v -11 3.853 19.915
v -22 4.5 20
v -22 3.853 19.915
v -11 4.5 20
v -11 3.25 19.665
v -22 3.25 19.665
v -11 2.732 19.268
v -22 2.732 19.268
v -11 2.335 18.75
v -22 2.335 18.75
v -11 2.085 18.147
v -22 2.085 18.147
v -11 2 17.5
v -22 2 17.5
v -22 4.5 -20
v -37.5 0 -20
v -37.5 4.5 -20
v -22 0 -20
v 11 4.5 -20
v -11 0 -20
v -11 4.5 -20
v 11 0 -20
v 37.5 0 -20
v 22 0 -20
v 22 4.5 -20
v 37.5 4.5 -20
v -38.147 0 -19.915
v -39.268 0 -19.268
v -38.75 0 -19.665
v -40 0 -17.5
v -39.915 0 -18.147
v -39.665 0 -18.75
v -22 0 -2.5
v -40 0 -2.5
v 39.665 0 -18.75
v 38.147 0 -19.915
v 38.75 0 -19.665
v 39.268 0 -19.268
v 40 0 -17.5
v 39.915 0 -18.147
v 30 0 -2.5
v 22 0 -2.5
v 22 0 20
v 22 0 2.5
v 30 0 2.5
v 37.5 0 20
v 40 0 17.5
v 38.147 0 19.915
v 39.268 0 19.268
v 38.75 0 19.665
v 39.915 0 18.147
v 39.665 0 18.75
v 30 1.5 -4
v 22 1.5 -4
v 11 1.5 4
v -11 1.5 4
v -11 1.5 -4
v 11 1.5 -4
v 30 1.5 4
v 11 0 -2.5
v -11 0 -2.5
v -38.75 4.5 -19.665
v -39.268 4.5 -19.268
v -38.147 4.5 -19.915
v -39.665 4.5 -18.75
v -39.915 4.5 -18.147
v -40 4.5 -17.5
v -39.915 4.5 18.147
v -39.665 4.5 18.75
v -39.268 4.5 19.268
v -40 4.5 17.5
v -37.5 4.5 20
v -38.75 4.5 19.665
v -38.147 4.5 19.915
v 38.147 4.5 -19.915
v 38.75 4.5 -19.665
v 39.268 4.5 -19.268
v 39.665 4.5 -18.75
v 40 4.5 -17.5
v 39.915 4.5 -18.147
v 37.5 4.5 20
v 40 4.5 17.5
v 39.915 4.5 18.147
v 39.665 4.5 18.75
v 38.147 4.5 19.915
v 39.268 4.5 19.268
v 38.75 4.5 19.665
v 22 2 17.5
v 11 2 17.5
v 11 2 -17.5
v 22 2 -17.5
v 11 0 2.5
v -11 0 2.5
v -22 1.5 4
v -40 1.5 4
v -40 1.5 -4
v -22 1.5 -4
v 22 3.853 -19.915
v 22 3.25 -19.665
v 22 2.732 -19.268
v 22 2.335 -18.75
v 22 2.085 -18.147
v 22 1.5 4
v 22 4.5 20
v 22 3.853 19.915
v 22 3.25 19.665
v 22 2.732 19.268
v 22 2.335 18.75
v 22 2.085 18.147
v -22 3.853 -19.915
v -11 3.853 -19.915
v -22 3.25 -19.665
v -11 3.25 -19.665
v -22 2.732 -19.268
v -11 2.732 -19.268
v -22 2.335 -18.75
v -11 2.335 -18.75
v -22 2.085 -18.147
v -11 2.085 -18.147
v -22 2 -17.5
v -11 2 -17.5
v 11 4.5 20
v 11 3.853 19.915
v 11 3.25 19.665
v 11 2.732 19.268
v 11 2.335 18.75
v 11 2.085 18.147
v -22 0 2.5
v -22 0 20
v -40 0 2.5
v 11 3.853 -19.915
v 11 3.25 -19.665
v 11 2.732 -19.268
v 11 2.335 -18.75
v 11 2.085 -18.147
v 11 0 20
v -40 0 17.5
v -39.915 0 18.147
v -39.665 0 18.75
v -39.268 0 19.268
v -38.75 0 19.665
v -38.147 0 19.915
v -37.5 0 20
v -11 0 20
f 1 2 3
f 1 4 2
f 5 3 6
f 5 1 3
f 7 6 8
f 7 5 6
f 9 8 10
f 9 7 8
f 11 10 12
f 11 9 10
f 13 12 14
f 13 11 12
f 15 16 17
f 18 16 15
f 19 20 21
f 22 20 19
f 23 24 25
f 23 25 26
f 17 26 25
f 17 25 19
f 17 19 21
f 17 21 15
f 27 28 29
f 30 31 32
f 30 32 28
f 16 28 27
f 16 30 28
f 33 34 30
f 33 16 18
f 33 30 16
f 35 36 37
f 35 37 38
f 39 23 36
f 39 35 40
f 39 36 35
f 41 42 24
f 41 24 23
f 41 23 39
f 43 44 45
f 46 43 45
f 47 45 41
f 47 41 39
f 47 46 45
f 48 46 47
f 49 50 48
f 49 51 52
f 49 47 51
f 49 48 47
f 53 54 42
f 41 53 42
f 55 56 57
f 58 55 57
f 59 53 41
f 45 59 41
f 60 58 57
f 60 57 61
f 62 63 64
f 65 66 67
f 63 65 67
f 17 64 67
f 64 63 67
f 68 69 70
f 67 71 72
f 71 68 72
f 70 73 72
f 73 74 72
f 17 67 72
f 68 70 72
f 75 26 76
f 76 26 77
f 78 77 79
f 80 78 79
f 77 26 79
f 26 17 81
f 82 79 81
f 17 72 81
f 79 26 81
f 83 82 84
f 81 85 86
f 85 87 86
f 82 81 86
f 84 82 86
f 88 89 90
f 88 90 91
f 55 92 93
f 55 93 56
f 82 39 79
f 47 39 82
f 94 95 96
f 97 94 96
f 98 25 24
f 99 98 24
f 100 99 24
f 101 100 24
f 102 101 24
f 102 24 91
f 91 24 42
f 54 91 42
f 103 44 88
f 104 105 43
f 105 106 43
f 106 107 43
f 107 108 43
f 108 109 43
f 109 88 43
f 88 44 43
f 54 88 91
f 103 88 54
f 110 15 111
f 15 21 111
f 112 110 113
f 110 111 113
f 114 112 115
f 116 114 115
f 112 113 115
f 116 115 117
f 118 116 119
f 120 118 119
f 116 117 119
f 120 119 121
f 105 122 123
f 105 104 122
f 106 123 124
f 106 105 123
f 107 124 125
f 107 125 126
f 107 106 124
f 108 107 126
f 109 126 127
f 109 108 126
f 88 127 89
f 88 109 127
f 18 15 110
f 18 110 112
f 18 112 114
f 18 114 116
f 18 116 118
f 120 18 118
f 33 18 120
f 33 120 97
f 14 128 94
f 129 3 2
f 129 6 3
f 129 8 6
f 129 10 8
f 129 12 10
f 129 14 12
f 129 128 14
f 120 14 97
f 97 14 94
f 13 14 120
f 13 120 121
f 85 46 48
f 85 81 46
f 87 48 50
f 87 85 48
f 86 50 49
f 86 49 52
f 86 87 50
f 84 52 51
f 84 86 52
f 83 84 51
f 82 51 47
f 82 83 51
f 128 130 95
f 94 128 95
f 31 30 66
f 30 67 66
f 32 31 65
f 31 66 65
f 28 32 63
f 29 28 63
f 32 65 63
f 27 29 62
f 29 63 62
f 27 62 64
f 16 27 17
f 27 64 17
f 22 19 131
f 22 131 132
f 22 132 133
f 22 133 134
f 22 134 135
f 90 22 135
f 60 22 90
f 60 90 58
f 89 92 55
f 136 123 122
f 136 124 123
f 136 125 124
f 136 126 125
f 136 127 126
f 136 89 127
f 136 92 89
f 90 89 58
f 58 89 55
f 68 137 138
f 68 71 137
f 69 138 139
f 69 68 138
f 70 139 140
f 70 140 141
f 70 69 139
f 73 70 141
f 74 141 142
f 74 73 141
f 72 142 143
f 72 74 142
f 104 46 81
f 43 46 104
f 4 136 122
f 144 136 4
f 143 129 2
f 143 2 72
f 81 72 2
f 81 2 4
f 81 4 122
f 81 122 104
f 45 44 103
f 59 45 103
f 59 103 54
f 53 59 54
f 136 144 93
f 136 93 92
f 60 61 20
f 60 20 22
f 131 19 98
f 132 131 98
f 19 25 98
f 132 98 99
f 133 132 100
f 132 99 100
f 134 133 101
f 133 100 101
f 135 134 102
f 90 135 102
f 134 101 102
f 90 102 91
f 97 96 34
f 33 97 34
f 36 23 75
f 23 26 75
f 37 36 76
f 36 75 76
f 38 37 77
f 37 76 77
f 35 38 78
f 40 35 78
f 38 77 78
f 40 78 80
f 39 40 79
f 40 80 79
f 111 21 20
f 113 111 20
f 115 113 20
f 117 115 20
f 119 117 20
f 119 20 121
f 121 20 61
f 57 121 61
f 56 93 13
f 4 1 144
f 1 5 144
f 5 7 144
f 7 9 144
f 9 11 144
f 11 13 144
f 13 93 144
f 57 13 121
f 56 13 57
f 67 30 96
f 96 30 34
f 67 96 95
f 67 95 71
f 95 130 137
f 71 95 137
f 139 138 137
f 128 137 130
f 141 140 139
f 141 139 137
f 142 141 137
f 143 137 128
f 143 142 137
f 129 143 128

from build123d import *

# Parameters (mm, degrees)
F0_W     = 18
F0_H     = 40
F0_W_2   = 11
F0_W_3   = 22
F1_DEPTH = 4.5
F2_W     = 11
F2_H     = 40
F3_DEPTH = 2
F5_DEPTH = 70
F6_R     = 2.49999


# Not quite as in the source:
# - a fillet or chamfer is up to 0.001 mm smaller than in the source, because OpenCascade refuses the exact size


with BuildPart() as f1:
    # F0 (on Front) → F1 (new body)
    with BuildSketch(Plane.XZ):
        with Locations((-31, 0)):
            Rectangle(F0_W, F0_H)
        with Locations((-16.5, 0)):
            Rectangle(F0_W_2, F0_H)
        Rectangle(F0_W_3, F0_H)
        with Locations((16.5, 0)):
            Rectangle(F0_W_2, F0_H)
        with Locations((31, 0)):
            Rectangle(F0_W, F0_H)
    extrude(amount=-F1_DEPTH)

    # F2 (on Front) → F3 (cut)
    with BuildSketch(Plane.XZ):
        with Locations((-16.5, 0)):
            Rectangle(F2_W, F2_H)
        with Locations((16.5, 0)):
            Rectangle(F2_W, F2_H)
    extrude(amount=-F3_DEPTH, mode=Mode.SUBTRACT)

    # F4 (on face) → F5 (cut)
    with BuildSketch(Plane(origin=(-40, 0, 0), x_dir=(0, -1, 0), z_dir=(-1, 0, 0))):
        Polygon((0, -2.5), (0, 0), (0, 2.5), (-1.5, 4), (-1.5, 0), (-1.5, -4), align=None)
    extrude(amount=-F5_DEPTH, mode=Mode.SUBTRACT)

    # F6 (radius 2.5 in the source; OpenCascade refuses exactly that, so slightly less here)
    f6_edges = [f1.edges().sort_by_distance(p)[0] for p in [
        (-16.5, 2, 20),
        (16.5, 2, 20),
        (16.5, 2, -20),
        (-16.5, 2, -20),
        (-40, 2.25, 20),
        (-40, 2.25, -20),
        (40, 2.25, -20),
        (40, 2.25, 20),
    ]]
    fillet(f6_edges, radius=F6_R)


solid = f1.part
